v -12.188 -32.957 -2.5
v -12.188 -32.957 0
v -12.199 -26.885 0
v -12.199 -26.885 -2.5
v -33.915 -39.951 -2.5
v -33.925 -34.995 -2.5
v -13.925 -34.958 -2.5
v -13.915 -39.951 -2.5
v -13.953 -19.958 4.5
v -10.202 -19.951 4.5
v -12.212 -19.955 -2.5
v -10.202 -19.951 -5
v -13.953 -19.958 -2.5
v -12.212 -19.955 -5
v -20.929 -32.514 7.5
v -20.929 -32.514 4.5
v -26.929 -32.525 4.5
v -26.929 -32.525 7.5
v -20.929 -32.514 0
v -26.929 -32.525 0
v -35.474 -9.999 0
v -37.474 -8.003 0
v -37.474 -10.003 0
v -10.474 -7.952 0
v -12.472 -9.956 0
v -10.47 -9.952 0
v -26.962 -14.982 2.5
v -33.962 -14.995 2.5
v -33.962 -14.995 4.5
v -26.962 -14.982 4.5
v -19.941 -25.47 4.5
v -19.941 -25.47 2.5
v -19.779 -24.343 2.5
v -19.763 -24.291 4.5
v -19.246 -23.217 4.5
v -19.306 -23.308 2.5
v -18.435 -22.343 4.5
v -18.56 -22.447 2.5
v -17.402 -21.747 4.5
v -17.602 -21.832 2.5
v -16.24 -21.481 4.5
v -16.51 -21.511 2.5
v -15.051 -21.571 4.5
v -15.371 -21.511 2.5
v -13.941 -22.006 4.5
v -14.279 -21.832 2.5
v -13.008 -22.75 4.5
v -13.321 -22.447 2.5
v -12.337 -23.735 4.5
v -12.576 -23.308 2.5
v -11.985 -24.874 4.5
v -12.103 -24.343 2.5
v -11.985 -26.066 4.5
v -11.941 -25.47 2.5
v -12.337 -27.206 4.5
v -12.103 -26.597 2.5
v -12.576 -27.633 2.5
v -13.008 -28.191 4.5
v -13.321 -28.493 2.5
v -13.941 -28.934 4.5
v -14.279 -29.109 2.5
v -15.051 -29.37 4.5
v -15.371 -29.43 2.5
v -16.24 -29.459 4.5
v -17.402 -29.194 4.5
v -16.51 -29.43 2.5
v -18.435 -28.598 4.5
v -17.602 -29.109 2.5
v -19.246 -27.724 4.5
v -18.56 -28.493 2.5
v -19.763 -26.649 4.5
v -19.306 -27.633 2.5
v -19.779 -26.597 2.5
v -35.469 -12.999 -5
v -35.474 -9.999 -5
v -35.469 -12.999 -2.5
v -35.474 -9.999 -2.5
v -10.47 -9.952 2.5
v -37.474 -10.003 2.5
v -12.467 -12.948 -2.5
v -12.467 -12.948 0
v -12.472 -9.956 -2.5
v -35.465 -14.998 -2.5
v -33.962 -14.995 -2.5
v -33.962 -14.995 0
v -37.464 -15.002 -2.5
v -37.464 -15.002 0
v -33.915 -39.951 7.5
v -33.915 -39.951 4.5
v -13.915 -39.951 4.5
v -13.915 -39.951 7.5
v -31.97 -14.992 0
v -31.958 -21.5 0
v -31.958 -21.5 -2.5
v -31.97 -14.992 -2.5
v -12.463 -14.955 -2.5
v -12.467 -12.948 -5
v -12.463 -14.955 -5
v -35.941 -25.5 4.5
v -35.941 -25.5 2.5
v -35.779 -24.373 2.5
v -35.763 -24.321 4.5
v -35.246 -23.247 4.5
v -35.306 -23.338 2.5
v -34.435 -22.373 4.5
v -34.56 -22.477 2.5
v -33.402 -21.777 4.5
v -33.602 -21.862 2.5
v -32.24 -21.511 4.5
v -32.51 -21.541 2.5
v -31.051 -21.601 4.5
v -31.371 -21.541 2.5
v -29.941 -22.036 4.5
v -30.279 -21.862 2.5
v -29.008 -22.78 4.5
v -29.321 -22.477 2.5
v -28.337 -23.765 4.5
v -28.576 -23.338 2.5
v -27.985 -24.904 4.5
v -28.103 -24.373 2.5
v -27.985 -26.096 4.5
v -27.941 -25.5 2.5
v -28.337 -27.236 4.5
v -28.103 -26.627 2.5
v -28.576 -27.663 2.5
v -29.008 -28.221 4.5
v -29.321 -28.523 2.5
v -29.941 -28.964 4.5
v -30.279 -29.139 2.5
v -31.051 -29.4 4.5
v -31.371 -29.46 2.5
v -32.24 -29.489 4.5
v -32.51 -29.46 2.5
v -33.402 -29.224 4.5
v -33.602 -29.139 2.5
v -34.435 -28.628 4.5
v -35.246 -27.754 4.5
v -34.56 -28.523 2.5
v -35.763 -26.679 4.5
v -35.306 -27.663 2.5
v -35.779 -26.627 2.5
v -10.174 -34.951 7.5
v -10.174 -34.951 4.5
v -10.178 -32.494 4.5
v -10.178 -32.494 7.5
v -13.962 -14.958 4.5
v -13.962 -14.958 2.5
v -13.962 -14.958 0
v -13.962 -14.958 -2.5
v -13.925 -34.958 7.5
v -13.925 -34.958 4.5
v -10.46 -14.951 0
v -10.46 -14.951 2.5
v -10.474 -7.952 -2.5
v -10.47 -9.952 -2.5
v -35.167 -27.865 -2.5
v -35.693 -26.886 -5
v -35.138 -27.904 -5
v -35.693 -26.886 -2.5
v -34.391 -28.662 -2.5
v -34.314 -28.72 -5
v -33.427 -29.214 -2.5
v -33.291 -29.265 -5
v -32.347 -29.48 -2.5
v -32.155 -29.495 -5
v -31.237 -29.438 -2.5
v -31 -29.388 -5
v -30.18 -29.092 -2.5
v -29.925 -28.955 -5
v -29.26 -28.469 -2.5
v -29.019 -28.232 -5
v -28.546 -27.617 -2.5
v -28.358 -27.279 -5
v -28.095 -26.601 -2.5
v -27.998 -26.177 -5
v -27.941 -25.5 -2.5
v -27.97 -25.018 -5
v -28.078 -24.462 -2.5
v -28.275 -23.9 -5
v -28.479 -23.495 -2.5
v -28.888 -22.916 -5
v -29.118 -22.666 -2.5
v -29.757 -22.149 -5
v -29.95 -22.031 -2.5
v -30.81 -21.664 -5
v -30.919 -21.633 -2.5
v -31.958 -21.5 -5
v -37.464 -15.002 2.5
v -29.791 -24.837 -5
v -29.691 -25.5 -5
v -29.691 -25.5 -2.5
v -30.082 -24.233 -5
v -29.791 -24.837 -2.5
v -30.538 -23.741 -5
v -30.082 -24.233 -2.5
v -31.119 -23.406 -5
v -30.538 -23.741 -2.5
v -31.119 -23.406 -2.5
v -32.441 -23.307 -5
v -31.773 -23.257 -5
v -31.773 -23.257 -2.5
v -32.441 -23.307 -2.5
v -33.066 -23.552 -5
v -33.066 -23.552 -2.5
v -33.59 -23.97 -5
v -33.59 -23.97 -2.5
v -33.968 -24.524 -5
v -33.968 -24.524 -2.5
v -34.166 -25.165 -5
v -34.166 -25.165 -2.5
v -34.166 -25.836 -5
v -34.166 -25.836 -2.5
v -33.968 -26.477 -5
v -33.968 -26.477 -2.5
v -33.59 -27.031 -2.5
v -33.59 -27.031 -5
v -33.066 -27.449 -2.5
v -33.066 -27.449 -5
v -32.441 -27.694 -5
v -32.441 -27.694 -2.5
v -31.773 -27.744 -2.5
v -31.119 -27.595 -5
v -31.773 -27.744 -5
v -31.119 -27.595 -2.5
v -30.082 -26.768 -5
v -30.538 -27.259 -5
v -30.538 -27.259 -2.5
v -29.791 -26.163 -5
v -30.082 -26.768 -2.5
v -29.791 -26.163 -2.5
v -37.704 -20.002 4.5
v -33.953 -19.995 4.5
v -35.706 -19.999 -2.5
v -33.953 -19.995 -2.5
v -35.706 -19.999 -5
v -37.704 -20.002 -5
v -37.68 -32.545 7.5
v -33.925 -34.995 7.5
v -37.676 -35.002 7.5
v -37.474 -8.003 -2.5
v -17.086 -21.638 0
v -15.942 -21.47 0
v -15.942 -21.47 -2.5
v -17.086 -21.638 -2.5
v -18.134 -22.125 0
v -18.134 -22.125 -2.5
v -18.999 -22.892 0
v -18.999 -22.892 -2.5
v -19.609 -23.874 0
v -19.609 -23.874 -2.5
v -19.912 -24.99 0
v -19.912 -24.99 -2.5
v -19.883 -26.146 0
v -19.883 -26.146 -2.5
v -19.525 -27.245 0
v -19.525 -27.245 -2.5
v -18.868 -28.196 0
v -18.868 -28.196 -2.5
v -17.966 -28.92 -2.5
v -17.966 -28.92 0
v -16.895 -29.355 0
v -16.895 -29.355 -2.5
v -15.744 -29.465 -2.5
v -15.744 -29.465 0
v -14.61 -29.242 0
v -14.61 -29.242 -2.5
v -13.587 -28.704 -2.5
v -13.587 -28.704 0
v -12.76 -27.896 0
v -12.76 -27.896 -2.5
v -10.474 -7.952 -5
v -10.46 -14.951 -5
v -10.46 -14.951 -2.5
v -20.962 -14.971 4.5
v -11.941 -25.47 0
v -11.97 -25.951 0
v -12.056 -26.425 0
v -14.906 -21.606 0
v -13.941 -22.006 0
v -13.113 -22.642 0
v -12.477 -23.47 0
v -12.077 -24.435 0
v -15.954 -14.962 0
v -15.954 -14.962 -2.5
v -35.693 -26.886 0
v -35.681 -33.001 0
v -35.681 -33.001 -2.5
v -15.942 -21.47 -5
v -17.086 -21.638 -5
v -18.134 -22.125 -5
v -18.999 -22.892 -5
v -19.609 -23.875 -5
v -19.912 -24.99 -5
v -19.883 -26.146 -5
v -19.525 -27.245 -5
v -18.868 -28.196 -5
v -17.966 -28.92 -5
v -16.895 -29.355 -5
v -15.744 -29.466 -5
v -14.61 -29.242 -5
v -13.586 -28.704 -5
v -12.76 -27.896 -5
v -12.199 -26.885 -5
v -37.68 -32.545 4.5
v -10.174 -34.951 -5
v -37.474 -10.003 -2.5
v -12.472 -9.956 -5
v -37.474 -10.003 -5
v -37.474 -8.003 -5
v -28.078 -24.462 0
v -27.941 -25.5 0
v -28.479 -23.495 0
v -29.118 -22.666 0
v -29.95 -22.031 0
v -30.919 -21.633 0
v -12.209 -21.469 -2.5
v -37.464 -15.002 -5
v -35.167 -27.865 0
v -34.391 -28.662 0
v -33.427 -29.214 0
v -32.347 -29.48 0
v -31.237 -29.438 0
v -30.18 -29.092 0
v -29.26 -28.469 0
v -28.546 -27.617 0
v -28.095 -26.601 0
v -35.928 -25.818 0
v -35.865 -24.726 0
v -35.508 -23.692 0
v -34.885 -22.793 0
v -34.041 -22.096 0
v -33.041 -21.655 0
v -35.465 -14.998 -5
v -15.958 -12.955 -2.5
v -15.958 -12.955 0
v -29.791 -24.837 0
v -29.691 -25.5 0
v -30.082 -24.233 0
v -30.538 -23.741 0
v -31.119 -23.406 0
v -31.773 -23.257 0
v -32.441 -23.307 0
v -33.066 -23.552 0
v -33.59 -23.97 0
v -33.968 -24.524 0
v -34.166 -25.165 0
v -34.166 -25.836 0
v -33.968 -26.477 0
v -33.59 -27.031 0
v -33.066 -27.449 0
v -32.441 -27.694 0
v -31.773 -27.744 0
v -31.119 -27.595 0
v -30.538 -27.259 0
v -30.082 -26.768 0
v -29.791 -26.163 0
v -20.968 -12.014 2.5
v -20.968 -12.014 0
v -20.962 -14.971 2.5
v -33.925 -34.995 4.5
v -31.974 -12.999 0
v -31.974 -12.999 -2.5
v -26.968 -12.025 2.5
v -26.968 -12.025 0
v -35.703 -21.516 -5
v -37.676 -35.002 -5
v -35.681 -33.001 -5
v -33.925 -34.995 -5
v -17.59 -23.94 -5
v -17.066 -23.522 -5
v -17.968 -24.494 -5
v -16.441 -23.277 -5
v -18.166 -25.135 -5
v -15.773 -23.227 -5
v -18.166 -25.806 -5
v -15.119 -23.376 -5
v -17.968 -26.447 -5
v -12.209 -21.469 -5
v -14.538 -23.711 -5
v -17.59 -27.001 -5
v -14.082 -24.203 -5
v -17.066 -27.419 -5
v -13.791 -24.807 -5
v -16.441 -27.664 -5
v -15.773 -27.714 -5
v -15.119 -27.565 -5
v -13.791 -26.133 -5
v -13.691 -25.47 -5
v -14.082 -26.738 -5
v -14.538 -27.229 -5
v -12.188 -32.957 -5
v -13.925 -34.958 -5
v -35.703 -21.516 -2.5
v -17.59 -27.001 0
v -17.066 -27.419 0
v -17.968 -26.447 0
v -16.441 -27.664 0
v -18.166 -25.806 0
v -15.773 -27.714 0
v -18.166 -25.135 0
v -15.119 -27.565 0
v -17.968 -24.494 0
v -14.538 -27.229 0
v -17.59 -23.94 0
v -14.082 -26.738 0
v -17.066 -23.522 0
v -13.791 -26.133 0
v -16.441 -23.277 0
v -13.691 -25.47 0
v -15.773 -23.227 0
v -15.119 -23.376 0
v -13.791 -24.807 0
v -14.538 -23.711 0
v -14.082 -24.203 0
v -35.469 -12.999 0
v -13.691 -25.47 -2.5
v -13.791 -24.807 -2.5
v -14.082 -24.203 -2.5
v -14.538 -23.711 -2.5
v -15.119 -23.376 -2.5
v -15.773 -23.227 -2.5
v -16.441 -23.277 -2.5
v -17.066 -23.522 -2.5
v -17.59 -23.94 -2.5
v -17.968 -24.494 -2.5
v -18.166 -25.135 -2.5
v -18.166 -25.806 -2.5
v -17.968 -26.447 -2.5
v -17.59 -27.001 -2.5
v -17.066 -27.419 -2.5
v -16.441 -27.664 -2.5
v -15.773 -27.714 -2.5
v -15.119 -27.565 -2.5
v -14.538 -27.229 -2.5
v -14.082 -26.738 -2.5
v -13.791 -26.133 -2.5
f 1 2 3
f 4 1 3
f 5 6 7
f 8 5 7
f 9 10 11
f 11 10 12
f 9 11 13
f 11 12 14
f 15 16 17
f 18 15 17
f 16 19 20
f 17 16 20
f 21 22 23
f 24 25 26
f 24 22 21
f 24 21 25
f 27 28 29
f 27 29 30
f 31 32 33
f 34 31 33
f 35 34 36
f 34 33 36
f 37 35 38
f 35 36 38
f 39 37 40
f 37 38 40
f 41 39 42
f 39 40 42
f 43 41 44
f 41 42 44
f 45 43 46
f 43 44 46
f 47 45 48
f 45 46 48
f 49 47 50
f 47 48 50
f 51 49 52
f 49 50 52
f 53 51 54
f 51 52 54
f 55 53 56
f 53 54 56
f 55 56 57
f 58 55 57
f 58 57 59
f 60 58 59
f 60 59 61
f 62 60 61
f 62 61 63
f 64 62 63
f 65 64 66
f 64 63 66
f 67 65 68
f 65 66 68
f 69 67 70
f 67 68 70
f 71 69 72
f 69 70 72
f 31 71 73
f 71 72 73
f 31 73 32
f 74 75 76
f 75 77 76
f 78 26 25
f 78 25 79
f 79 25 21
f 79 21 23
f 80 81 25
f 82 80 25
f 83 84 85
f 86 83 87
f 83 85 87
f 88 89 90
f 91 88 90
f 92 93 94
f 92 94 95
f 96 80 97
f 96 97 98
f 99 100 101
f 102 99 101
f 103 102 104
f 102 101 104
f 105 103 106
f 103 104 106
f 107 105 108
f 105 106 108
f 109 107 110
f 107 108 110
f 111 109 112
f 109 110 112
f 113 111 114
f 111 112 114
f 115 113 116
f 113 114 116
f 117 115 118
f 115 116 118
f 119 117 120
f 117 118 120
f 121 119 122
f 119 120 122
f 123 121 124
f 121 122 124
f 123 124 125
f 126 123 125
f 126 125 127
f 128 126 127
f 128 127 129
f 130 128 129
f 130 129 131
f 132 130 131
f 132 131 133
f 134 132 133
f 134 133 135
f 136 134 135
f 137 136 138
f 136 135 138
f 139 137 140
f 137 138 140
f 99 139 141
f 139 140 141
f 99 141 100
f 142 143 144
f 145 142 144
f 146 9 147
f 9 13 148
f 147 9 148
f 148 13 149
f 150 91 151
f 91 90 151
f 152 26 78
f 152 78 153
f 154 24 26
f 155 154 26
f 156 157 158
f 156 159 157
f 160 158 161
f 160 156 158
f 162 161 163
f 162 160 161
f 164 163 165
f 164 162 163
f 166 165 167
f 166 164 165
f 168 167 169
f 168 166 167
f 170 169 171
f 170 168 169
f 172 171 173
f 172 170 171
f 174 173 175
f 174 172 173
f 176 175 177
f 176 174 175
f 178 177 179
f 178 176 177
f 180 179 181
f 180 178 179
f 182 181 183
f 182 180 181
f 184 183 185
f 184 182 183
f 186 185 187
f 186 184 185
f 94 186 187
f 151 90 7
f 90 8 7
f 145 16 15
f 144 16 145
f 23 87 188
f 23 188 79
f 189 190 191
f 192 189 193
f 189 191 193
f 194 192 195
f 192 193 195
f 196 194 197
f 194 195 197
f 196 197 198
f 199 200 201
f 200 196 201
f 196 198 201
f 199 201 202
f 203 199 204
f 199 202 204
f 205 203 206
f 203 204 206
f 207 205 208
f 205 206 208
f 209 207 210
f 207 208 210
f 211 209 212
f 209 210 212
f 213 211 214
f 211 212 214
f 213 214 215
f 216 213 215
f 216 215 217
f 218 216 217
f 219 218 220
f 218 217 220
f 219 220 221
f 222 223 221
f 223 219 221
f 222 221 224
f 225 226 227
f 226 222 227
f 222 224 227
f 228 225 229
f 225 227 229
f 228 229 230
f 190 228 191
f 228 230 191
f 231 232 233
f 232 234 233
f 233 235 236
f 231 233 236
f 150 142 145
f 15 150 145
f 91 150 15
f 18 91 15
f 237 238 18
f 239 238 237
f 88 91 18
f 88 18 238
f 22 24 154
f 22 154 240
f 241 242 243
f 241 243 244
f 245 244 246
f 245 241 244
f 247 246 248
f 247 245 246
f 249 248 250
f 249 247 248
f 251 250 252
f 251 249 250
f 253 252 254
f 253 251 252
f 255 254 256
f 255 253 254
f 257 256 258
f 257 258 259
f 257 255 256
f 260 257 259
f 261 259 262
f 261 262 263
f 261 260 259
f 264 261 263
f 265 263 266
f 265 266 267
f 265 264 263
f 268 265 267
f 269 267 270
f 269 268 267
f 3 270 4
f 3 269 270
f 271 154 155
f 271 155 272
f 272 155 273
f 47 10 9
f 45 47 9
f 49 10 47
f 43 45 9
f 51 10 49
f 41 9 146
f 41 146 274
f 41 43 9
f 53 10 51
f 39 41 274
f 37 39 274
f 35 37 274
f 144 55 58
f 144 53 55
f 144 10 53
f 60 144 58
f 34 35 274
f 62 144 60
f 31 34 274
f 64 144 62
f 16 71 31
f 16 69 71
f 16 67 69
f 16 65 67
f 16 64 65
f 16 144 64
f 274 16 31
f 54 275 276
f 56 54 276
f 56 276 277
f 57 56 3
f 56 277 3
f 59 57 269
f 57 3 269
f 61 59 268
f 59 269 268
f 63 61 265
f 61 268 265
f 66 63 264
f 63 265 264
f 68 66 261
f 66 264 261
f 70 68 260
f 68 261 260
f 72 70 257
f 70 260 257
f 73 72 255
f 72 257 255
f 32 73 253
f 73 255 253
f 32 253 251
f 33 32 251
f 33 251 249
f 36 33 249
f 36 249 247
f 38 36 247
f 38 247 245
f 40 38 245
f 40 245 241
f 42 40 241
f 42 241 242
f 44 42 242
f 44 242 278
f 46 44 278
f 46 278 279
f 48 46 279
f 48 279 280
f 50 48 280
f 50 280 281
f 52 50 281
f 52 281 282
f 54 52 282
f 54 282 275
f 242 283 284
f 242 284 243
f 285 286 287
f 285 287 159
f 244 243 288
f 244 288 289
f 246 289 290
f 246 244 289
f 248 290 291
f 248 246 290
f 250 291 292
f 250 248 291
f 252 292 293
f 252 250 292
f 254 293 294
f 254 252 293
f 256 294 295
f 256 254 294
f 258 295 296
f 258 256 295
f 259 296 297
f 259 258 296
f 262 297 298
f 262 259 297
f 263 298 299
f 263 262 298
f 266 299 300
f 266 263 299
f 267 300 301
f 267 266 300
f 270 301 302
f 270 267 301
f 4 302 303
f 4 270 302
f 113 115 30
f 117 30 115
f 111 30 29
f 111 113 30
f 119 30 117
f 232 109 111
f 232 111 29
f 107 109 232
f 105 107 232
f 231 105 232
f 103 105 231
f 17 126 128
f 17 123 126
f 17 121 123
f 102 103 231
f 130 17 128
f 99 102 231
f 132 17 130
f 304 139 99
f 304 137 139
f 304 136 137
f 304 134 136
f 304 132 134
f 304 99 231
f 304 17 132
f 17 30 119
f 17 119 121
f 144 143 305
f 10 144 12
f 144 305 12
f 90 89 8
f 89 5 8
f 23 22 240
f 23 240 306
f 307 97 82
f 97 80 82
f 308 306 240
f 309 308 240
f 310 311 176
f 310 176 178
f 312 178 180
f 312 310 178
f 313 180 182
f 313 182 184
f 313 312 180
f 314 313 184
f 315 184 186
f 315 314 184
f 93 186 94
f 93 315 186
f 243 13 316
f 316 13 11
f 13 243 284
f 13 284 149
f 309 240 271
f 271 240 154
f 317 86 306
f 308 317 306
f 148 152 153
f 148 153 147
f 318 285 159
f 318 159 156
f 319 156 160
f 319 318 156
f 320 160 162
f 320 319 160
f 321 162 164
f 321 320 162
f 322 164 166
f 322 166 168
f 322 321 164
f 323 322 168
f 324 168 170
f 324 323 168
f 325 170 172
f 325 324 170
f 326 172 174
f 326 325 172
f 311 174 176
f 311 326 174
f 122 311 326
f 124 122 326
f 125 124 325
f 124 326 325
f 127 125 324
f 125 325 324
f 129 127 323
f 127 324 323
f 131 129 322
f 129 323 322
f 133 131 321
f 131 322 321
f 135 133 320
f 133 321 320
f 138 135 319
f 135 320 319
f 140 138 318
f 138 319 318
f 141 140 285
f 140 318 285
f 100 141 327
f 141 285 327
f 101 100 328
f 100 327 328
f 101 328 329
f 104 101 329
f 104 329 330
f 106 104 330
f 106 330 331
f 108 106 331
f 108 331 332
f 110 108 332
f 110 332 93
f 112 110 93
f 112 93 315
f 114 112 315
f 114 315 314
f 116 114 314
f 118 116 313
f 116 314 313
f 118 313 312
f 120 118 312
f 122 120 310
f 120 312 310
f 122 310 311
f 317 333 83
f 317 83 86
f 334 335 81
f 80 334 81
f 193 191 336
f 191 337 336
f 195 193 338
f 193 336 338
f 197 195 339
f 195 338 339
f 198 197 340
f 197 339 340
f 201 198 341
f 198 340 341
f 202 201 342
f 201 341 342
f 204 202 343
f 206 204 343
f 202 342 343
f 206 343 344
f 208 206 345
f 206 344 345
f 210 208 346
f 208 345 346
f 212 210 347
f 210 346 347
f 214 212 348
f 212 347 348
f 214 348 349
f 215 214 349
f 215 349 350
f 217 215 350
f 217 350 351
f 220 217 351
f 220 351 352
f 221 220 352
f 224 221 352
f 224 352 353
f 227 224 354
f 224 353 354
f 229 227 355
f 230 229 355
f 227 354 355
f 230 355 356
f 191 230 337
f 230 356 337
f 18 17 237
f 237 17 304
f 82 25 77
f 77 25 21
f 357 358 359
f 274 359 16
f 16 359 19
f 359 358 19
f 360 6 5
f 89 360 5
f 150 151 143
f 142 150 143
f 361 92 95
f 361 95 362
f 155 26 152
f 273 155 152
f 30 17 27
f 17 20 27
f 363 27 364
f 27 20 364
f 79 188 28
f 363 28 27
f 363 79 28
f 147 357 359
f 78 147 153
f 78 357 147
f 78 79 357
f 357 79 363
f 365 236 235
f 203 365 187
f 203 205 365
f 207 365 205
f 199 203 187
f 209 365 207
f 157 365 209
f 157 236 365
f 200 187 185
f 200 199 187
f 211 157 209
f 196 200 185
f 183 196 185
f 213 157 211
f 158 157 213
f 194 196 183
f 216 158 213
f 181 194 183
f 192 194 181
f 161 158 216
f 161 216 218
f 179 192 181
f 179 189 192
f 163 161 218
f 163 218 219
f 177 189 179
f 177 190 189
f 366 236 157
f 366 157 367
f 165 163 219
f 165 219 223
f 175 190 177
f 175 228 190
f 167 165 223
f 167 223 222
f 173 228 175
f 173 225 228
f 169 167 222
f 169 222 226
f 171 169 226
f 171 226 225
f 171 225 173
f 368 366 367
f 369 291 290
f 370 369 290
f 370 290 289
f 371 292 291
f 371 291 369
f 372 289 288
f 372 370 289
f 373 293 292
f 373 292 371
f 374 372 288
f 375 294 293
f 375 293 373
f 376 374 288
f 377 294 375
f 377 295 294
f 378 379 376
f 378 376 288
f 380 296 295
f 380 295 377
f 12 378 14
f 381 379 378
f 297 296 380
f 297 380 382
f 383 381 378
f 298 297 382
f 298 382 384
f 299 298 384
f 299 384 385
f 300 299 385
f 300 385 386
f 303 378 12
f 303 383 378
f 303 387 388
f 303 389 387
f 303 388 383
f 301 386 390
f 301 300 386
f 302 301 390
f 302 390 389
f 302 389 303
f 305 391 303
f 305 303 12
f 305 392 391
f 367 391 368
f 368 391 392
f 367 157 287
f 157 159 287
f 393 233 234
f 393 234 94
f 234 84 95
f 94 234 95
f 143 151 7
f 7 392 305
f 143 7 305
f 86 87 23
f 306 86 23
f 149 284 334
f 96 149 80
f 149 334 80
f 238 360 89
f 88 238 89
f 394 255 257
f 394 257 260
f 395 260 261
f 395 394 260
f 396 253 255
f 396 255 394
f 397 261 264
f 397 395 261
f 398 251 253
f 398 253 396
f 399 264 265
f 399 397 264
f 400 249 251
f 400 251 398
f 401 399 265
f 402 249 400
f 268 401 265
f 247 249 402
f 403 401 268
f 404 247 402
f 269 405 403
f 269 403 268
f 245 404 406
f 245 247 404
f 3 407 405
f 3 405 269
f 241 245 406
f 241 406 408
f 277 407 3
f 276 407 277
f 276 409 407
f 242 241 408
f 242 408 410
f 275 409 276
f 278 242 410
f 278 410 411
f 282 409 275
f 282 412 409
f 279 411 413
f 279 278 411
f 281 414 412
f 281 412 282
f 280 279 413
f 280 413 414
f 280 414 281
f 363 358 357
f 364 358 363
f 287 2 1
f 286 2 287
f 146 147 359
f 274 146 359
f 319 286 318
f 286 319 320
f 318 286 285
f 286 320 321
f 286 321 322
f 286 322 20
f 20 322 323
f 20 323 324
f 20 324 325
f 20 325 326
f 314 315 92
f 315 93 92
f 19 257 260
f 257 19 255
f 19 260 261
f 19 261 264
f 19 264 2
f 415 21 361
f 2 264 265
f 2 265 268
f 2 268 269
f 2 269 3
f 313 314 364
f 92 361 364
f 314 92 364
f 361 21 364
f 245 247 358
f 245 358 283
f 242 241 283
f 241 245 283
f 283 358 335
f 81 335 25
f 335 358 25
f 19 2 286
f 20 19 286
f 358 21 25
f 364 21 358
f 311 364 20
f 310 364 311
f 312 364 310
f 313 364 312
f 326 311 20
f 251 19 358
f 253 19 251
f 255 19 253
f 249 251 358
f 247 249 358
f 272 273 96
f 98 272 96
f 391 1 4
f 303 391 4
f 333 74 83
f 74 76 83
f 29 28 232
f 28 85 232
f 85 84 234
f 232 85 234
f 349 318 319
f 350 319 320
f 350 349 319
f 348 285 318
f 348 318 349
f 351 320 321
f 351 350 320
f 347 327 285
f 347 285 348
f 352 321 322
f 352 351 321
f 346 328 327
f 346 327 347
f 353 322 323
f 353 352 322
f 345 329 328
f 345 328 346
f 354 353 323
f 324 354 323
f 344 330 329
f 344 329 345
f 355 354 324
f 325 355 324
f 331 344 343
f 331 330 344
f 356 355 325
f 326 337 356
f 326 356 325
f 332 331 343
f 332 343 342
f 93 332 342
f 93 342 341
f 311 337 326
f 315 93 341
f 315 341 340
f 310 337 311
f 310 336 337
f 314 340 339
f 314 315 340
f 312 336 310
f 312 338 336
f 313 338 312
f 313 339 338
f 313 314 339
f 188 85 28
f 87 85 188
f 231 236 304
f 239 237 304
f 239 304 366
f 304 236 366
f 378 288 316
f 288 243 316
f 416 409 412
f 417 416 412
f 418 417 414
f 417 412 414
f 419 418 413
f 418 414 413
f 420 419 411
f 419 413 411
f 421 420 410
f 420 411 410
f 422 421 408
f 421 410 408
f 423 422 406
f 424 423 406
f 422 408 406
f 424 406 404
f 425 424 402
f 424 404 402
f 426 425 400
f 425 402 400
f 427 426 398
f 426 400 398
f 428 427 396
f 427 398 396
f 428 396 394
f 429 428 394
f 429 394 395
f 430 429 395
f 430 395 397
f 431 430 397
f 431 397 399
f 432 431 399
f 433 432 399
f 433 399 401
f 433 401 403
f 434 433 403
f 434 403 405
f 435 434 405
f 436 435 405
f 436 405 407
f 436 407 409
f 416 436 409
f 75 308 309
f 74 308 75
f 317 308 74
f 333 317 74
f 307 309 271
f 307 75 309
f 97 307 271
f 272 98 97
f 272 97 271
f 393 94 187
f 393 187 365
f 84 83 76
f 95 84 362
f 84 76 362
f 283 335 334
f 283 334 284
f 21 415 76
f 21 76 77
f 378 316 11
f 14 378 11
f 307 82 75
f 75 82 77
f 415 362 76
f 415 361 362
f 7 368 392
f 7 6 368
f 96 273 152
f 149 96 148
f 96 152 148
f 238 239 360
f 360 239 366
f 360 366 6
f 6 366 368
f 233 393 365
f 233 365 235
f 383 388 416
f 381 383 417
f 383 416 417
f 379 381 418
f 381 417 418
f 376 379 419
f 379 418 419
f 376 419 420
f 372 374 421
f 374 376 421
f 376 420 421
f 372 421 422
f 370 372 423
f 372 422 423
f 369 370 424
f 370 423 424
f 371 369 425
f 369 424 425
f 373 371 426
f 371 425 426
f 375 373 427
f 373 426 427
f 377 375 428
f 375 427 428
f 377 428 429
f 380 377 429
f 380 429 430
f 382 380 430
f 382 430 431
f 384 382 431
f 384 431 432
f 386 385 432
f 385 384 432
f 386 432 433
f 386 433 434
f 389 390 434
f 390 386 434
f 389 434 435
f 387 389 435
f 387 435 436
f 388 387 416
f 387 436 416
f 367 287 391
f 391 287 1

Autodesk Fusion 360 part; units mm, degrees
sketch "Sketch1" plane through (0, 0, 0) normal (0, 0, 1) x (1, 0, 0) in component "PecaPorta"
  line L0 (-37.704, -20.0025) -> (-33.9529, -19.9954)
  line L1 (-33.9529, -19.9954) -> (-33.9623, -14.9954)
  line L2 (-33.9623, -14.9954) -> (-37.4642, -15.002)
  line L3 (-37.4642, -15.002) -> (-37.4736, -10.0032)
  line L4 (-37.704, -20.0025) -> (-37.6758, -35.0025)
  line L5 (-10.4698, -9.9525) -> (-10.4604, -14.9513)
  line L6 (-10.1737, -34.9508) -> (-10.2018, -19.9508)
  line L7 (-10.2018, -19.9508) -> (-13.9529, -19.9579)
  line L8 (-13.9529, -19.9579) -> (-13.9623, -14.9579)
  line L9 (-10.4604, -14.9513) -> (-13.9623, -14.9579)
  line L10 (-26.9294, -32.5252) -> (-20.9294, -32.514)
  line L11 (-20.9294, -32.514) -> (-20.9679, -12.014)
  line L12 (-20.9679, -12.014) -> (-26.9679, -12.0253)
  line L13 (-26.9679, -12.0253) -> (-26.9294, -32.5252)
  circle A0 centre (-31.9407, -25.5003) radius 4
  circle A1 centre (-15.9407, -25.4703) radius 4
  line L14 (-33.9154, -39.9508) -> (-13.9154, -39.9508)
  line L15 (-33.9154, -39.9508) -> (-33.9247, -34.9954)
  line L16 (-13.9154, -39.9508) -> (-13.9248, -34.9579)
  line L17 (-10.4698, -9.9525) -> (-37.4736, -10.0032)
  circle A2 centre (-31.9407, -25.5003) radius 2.25
  circle A3 centre (-15.9407, -25.4703) radius 2.25
  line L18 (-10.4736, -7.9525) -> (-10.4698, -9.9525)
  line L19 (-10.4736, -7.9525) -> (-37.4736, -8.0032)
  line L20 (-37.4736, -8.0032) -> (-37.4736, -10.0032)
  line L21 (-37.6758, -35.0025) -> (-33.9247, -34.9954)
  line L22 (-13.9248, -34.9579) -> (-10.1737, -34.9508)
  line L23 (-13.9248, -34.9579) -> (-33.9247, -34.9954)
  line L24 (-12.1877, -32.9568) -> (-12.1991, -26.8848)
  line L25 (-12.2045, -24.0418) -> (-12.2084, -21.9579)
  line L26 (-12.2084, -21.9579) -> (-14.0206, -21.9613)
  line L27 (-15.9576, -12.9546) -> (-15.9416, -21.4703)
  line L28 (-15.9576, -12.9546) -> (-12.4668, -12.9481)
  line L29 (-12.4668, -12.9481) -> (-12.4724, -9.9562)
  line L30 (-12.1877, -32.9568) -> (-35.6814, -33.0009)
  line L31 (-35.6814, -33.0009) -> (-35.6929, -26.8864)
  line L32 (-35.6981, -24.1284) -> (-35.7021, -21.9994)
  line L33 (-33.8756, -21.9994) -> (-35.7021, -21.9994)
  line L34 (-31.9576, -21.5004) -> (-31.9736, -12.9987)
  line L35 (-31.9736, -12.9987) -> (-35.4689, -12.9987)
  line L36 (-35.4689, -12.9987) -> (-35.4745, -9.9994)
  line L37 (-13.9623, -14.9579) -> (-20.9623, -14.971)
  line L38 (-33.9623, -14.9954) -> (-26.9623, -14.9823)
  dimension "d28" = 20
  dimension "d40" = 27
extrude "Extrude7" add sketch "Sketch1" along normal blind 2.5 contours L0 L1 L4 L6 L7 L8 A0 A1 L21 L22 L23 L24 L25 L26 L27 L30 L31 L32 L33 L34 L37 L38 | L2 L3 L17 L34 L35 L36 L38 | L14 L15 L16 L23 | L10 L11 L13 A0 A1 L24 L27 L30 L31 L34 L37 L38 | L11 L12 L13 L17 L27 L28 L29 L34 L35 L36 L37 L38 | A0 L32 L33 | L5 L9 L17 L27 L28 L29 L37 | A1 L25 L26
sketch "Sketch3" plane through (0, 0, 2.5) normal (0, 0, 1) x (-1, 0, 0)
  circle A0 centre (31.9407, 25.5003) radius 4
  line L0 (26.9294, 32.5252) -> (26.9679, 12.0253)
  line L1 (26.9679, 12.0253) -> (20.9679, 12.014)
  line L2 (20.9679, 12.014) -> (20.9294, 32.514)
  line L3 (20.9294, 32.514) -> (26.9294, 32.5252)
  circle A1 centre (15.9407, 25.4703) radius 4
  line L4 (33.9154, 39.9508) -> (13.9154, 39.9508)
  line L5 (13.9154, 39.9508) -> (13.9248, 34.9579)
  line L6 (13.9248, 34.9579) -> (10.1737, 34.9508)
  line L7 (10.1737, 34.9508) -> (10.2018, 19.9508)
  line L8 (10.2018, 19.9508) -> (13.9529, 19.9579)
  line L9 (13.9529, 19.9579) -> (13.9623, 14.9579)
  line L10 (13.9623, 14.9579) -> (10.4604, 14.9513)
  line L11 (10.4604, 14.9513) -> (10.4698, 9.9525)
  line L12 (10.4698, 9.9525) -> (37.4736, 10.0032)
  line L13 (37.4736, 10.0032) -> (37.4642, 15.002)
  line L14 (37.4642, 15.002) -> (33.9623, 14.9954)
  line L15 (33.9623, 14.9954) -> (33.9529, 19.9954)
  line L16 (33.9529, 19.9954) -> (37.704, 20.0025)
  line L17 (37.704, 20.0025) -> (37.6758, 35.0025)
  line L18 (37.6758, 35.0025) -> (33.9247, 34.9954)
  line L19 (33.9247, 34.9954) -> (33.9154, 39.9508)
  line L20 (13.9623, 14.9579) -> (20.9623, 14.971)
  line L21 (33.9623, 14.9954) -> (26.9623, 14.9823)
  point P0 (20.9623, 14.971)
  point P1 (26.9623, 14.9823)
extrude "Extrude8" add sketch "Sketch3" along normal blind 2 contours L0 L2 L3 L4 L5 L6 L7 L8 L9 L15 L16 L17 L18 L19 L20 L21
extrude "Extrude9" add sketch "Sketch1" against normal blind 2.5 contours L0 L1 L4 L6 L7 L8 A0 A1 L21 L22 L23 L24 L25 L26 L27 L30 L31 L32 L33 L34 L37 L38 | L2 L3 L17 L34 L35 L36 L38 | L14 L15 L16 L23 | L17 L18 L19 L20 | A0 | A0 L32 L33 | L5 L9 L17 L27 L28 L29 L37 | A1 | A1 L25 L26
sketch "Sketch4" plane through (0, 0, -2.5) normal (0, 0, -1) x (1, 0, 0)
  circle A0 centre (-31.9407, 25.5003) radius 2.25
  line L0 (-12.1877, 32.9568) -> (-12.1991, 26.8848)
  arc A1 (-12.1991, 26.8848) -> (-15.9416, 21.4703) centre (-15.9407, 25.4703) ccw
  line L1 (-15.9416, 21.4703) -> (-15.9576, 12.9546)
  line L2 (-15.9576, 12.9546) -> (-12.4668, 12.9481)
  line L3 (-12.4668, 12.9481) -> (-12.4724, 9.9562)
  line L4 (-12.4724, 9.9562) -> (-35.4745, 9.9994)
  line L5 (-35.4745, 9.9994) -> (-35.4689, 12.9987)
  line L6 (-35.4689, 12.9987) -> (-31.9736, 12.9987)
  line L7 (-31.9736, 12.9987) -> (-31.9576, 21.5004)
  arc A2 (-31.9576, 21.5004) -> (-35.6929, 26.8864) centre (-31.9407, 25.5003) ccw
  line L8 (-35.6929, 26.8864) -> (-35.6814, 33.0009)
  line L9 (-35.6814, 33.0009) -> (-12.1877, 32.9568)
  circle A3 centre (-15.9407, 25.4703) radius 2.25
  line L10 (-13.9154, 39.9508) -> (-33.9154, 39.9508)
  line L11 (-33.9154, 39.9508) -> (-33.9247, 34.9954)
  line L12 (-33.9247, 34.9954) -> (-37.6758, 35.0025)
  line L13 (-37.6758, 35.0025) -> (-37.704, 20.0025)
  line L14 (-37.704, 20.0025) -> (-33.9529, 19.9954)
  line L15 (-33.9529, 19.9954) -> (-33.9623, 14.9954)
  line L16 (-33.9623, 14.9954) -> (-37.4642, 15.002)
  line L17 (-37.4642, 15.002) -> (-37.4736, 10.0032)
  line L18 (-37.4736, 10.0032) -> (-37.4736, 8.0032)
  line L19 (-37.4736, 8.0032) -> (-10.4736, 7.9525)
  line L20 (-10.4736, 7.9525) -> (-10.4604, 14.9513)
  line L21 (-10.4604, 14.9513) -> (-13.9623, 14.9579)
  line L22 (-13.9623, 14.9579) -> (-13.9529, 19.9579)
  line L23 (-13.9529, 19.9579) -> (-10.2018, 19.9508)
  line L24 (-10.2018, 19.9508) -> (-10.1737, 34.9508)
  line L25 (-10.1737, 34.9508) -> (-13.9248, 34.9579)
  line L26 (-13.9248, 34.9579) -> (-13.9154, 39.9508)
  line L27 (-35.4689, 12.9987) -> (-35.4651, 14.9983)
  line L28 (-33.9247, 34.9954) -> (-13.9248, 34.9579)
  line L29 (-12.4668, 12.9481) -> (-12.463, 14.9551)
  circle A4 centre (-15.9407, 25.4703) radius 4
  circle A5 centre (-31.9407, 25.5003) radius 4
  line L30 (-15.9416, 21.4703) -> (-12.2093, 21.4694)
  line L31 (-12.2093, 21.4694) -> (-12.2122, 19.9546)
  line L32 (-31.9576, 21.5004) -> (-35.703, 21.5162)
  line L33 (-35.703, 21.5162) -> (-35.7058, 19.9987)
extrude "Extrude10" add sketch "Sketch4" along normal blind 2.5 contours L0 L8 L9 L12 L13 L14 L23 L24 L25 L28 A4 A5 L30 L31 L32 L33 | A1 A4 | A2 A5 | L3 L4 L5 L16 L17 L18 L19 L20 L21 L27 L29
sketch "Sketch5" plane through (0, 0, 4.5) normal (0, 0, 1) x (-1, 0, 0)
  circle A0 centre (15.9407, 25.4703) radius 4
  circle A1 centre (31.9407, 25.5003) radius 4
  line L0 (33.9529, 19.9954) -> (37.704, 20.0025)
  line L1 (37.704, 20.0025) -> (37.6758, 35.0025)
  line L2 (37.6758, 35.0025) -> (33.9247, 34.9954)
  line L3 (33.9247, 34.9954) -> (33.9154, 39.9508)
  line L4 (33.9154, 39.9508) -> (13.9154, 39.9508)
  line L5 (13.9154, 39.9508) -> (13.9248, 34.9579)
  line L6 (13.9248, 34.9579) -> (10.1737, 34.9508)
  line L7 (10.1737, 34.9508) -> (10.2018, 19.9508)
  line L8 (10.2018, 19.9508) -> (13.9529, 19.9579)
  line L9 (13.9529, 19.9579) -> (13.9623, 14.9579)
  line L10 (13.9623, 14.9579) -> (20.9623, 14.971)
  line L11 (20.9623, 14.971) -> (20.9294, 32.514)
  line L12 (20.9294, 32.514) -> (26.9294, 32.5252)
  line L13 (26.9294, 32.5252) -> (26.9623, 14.9823)
  line L14 (26.9623, 14.9823) -> (33.9623, 14.9954)
  line L15 (33.9623, 14.9954) -> (33.9529, 19.9954)
  line L16 (20.9294, 32.514) -> (10.1783, 32.4938)
  line L17 (26.9294, 32.5252) -> (37.6805, 32.5454)
extrude "Extrude11" add sketch "Sketch5" along normal blind 3 contours L1 L2 L3 L4 L5 L6 L7 L12 L16 L17
component "PecaPorta" placed x (1, 0, 0) y (0, 1, 0) z (0, 0, 1) at (0, 0, 0)
